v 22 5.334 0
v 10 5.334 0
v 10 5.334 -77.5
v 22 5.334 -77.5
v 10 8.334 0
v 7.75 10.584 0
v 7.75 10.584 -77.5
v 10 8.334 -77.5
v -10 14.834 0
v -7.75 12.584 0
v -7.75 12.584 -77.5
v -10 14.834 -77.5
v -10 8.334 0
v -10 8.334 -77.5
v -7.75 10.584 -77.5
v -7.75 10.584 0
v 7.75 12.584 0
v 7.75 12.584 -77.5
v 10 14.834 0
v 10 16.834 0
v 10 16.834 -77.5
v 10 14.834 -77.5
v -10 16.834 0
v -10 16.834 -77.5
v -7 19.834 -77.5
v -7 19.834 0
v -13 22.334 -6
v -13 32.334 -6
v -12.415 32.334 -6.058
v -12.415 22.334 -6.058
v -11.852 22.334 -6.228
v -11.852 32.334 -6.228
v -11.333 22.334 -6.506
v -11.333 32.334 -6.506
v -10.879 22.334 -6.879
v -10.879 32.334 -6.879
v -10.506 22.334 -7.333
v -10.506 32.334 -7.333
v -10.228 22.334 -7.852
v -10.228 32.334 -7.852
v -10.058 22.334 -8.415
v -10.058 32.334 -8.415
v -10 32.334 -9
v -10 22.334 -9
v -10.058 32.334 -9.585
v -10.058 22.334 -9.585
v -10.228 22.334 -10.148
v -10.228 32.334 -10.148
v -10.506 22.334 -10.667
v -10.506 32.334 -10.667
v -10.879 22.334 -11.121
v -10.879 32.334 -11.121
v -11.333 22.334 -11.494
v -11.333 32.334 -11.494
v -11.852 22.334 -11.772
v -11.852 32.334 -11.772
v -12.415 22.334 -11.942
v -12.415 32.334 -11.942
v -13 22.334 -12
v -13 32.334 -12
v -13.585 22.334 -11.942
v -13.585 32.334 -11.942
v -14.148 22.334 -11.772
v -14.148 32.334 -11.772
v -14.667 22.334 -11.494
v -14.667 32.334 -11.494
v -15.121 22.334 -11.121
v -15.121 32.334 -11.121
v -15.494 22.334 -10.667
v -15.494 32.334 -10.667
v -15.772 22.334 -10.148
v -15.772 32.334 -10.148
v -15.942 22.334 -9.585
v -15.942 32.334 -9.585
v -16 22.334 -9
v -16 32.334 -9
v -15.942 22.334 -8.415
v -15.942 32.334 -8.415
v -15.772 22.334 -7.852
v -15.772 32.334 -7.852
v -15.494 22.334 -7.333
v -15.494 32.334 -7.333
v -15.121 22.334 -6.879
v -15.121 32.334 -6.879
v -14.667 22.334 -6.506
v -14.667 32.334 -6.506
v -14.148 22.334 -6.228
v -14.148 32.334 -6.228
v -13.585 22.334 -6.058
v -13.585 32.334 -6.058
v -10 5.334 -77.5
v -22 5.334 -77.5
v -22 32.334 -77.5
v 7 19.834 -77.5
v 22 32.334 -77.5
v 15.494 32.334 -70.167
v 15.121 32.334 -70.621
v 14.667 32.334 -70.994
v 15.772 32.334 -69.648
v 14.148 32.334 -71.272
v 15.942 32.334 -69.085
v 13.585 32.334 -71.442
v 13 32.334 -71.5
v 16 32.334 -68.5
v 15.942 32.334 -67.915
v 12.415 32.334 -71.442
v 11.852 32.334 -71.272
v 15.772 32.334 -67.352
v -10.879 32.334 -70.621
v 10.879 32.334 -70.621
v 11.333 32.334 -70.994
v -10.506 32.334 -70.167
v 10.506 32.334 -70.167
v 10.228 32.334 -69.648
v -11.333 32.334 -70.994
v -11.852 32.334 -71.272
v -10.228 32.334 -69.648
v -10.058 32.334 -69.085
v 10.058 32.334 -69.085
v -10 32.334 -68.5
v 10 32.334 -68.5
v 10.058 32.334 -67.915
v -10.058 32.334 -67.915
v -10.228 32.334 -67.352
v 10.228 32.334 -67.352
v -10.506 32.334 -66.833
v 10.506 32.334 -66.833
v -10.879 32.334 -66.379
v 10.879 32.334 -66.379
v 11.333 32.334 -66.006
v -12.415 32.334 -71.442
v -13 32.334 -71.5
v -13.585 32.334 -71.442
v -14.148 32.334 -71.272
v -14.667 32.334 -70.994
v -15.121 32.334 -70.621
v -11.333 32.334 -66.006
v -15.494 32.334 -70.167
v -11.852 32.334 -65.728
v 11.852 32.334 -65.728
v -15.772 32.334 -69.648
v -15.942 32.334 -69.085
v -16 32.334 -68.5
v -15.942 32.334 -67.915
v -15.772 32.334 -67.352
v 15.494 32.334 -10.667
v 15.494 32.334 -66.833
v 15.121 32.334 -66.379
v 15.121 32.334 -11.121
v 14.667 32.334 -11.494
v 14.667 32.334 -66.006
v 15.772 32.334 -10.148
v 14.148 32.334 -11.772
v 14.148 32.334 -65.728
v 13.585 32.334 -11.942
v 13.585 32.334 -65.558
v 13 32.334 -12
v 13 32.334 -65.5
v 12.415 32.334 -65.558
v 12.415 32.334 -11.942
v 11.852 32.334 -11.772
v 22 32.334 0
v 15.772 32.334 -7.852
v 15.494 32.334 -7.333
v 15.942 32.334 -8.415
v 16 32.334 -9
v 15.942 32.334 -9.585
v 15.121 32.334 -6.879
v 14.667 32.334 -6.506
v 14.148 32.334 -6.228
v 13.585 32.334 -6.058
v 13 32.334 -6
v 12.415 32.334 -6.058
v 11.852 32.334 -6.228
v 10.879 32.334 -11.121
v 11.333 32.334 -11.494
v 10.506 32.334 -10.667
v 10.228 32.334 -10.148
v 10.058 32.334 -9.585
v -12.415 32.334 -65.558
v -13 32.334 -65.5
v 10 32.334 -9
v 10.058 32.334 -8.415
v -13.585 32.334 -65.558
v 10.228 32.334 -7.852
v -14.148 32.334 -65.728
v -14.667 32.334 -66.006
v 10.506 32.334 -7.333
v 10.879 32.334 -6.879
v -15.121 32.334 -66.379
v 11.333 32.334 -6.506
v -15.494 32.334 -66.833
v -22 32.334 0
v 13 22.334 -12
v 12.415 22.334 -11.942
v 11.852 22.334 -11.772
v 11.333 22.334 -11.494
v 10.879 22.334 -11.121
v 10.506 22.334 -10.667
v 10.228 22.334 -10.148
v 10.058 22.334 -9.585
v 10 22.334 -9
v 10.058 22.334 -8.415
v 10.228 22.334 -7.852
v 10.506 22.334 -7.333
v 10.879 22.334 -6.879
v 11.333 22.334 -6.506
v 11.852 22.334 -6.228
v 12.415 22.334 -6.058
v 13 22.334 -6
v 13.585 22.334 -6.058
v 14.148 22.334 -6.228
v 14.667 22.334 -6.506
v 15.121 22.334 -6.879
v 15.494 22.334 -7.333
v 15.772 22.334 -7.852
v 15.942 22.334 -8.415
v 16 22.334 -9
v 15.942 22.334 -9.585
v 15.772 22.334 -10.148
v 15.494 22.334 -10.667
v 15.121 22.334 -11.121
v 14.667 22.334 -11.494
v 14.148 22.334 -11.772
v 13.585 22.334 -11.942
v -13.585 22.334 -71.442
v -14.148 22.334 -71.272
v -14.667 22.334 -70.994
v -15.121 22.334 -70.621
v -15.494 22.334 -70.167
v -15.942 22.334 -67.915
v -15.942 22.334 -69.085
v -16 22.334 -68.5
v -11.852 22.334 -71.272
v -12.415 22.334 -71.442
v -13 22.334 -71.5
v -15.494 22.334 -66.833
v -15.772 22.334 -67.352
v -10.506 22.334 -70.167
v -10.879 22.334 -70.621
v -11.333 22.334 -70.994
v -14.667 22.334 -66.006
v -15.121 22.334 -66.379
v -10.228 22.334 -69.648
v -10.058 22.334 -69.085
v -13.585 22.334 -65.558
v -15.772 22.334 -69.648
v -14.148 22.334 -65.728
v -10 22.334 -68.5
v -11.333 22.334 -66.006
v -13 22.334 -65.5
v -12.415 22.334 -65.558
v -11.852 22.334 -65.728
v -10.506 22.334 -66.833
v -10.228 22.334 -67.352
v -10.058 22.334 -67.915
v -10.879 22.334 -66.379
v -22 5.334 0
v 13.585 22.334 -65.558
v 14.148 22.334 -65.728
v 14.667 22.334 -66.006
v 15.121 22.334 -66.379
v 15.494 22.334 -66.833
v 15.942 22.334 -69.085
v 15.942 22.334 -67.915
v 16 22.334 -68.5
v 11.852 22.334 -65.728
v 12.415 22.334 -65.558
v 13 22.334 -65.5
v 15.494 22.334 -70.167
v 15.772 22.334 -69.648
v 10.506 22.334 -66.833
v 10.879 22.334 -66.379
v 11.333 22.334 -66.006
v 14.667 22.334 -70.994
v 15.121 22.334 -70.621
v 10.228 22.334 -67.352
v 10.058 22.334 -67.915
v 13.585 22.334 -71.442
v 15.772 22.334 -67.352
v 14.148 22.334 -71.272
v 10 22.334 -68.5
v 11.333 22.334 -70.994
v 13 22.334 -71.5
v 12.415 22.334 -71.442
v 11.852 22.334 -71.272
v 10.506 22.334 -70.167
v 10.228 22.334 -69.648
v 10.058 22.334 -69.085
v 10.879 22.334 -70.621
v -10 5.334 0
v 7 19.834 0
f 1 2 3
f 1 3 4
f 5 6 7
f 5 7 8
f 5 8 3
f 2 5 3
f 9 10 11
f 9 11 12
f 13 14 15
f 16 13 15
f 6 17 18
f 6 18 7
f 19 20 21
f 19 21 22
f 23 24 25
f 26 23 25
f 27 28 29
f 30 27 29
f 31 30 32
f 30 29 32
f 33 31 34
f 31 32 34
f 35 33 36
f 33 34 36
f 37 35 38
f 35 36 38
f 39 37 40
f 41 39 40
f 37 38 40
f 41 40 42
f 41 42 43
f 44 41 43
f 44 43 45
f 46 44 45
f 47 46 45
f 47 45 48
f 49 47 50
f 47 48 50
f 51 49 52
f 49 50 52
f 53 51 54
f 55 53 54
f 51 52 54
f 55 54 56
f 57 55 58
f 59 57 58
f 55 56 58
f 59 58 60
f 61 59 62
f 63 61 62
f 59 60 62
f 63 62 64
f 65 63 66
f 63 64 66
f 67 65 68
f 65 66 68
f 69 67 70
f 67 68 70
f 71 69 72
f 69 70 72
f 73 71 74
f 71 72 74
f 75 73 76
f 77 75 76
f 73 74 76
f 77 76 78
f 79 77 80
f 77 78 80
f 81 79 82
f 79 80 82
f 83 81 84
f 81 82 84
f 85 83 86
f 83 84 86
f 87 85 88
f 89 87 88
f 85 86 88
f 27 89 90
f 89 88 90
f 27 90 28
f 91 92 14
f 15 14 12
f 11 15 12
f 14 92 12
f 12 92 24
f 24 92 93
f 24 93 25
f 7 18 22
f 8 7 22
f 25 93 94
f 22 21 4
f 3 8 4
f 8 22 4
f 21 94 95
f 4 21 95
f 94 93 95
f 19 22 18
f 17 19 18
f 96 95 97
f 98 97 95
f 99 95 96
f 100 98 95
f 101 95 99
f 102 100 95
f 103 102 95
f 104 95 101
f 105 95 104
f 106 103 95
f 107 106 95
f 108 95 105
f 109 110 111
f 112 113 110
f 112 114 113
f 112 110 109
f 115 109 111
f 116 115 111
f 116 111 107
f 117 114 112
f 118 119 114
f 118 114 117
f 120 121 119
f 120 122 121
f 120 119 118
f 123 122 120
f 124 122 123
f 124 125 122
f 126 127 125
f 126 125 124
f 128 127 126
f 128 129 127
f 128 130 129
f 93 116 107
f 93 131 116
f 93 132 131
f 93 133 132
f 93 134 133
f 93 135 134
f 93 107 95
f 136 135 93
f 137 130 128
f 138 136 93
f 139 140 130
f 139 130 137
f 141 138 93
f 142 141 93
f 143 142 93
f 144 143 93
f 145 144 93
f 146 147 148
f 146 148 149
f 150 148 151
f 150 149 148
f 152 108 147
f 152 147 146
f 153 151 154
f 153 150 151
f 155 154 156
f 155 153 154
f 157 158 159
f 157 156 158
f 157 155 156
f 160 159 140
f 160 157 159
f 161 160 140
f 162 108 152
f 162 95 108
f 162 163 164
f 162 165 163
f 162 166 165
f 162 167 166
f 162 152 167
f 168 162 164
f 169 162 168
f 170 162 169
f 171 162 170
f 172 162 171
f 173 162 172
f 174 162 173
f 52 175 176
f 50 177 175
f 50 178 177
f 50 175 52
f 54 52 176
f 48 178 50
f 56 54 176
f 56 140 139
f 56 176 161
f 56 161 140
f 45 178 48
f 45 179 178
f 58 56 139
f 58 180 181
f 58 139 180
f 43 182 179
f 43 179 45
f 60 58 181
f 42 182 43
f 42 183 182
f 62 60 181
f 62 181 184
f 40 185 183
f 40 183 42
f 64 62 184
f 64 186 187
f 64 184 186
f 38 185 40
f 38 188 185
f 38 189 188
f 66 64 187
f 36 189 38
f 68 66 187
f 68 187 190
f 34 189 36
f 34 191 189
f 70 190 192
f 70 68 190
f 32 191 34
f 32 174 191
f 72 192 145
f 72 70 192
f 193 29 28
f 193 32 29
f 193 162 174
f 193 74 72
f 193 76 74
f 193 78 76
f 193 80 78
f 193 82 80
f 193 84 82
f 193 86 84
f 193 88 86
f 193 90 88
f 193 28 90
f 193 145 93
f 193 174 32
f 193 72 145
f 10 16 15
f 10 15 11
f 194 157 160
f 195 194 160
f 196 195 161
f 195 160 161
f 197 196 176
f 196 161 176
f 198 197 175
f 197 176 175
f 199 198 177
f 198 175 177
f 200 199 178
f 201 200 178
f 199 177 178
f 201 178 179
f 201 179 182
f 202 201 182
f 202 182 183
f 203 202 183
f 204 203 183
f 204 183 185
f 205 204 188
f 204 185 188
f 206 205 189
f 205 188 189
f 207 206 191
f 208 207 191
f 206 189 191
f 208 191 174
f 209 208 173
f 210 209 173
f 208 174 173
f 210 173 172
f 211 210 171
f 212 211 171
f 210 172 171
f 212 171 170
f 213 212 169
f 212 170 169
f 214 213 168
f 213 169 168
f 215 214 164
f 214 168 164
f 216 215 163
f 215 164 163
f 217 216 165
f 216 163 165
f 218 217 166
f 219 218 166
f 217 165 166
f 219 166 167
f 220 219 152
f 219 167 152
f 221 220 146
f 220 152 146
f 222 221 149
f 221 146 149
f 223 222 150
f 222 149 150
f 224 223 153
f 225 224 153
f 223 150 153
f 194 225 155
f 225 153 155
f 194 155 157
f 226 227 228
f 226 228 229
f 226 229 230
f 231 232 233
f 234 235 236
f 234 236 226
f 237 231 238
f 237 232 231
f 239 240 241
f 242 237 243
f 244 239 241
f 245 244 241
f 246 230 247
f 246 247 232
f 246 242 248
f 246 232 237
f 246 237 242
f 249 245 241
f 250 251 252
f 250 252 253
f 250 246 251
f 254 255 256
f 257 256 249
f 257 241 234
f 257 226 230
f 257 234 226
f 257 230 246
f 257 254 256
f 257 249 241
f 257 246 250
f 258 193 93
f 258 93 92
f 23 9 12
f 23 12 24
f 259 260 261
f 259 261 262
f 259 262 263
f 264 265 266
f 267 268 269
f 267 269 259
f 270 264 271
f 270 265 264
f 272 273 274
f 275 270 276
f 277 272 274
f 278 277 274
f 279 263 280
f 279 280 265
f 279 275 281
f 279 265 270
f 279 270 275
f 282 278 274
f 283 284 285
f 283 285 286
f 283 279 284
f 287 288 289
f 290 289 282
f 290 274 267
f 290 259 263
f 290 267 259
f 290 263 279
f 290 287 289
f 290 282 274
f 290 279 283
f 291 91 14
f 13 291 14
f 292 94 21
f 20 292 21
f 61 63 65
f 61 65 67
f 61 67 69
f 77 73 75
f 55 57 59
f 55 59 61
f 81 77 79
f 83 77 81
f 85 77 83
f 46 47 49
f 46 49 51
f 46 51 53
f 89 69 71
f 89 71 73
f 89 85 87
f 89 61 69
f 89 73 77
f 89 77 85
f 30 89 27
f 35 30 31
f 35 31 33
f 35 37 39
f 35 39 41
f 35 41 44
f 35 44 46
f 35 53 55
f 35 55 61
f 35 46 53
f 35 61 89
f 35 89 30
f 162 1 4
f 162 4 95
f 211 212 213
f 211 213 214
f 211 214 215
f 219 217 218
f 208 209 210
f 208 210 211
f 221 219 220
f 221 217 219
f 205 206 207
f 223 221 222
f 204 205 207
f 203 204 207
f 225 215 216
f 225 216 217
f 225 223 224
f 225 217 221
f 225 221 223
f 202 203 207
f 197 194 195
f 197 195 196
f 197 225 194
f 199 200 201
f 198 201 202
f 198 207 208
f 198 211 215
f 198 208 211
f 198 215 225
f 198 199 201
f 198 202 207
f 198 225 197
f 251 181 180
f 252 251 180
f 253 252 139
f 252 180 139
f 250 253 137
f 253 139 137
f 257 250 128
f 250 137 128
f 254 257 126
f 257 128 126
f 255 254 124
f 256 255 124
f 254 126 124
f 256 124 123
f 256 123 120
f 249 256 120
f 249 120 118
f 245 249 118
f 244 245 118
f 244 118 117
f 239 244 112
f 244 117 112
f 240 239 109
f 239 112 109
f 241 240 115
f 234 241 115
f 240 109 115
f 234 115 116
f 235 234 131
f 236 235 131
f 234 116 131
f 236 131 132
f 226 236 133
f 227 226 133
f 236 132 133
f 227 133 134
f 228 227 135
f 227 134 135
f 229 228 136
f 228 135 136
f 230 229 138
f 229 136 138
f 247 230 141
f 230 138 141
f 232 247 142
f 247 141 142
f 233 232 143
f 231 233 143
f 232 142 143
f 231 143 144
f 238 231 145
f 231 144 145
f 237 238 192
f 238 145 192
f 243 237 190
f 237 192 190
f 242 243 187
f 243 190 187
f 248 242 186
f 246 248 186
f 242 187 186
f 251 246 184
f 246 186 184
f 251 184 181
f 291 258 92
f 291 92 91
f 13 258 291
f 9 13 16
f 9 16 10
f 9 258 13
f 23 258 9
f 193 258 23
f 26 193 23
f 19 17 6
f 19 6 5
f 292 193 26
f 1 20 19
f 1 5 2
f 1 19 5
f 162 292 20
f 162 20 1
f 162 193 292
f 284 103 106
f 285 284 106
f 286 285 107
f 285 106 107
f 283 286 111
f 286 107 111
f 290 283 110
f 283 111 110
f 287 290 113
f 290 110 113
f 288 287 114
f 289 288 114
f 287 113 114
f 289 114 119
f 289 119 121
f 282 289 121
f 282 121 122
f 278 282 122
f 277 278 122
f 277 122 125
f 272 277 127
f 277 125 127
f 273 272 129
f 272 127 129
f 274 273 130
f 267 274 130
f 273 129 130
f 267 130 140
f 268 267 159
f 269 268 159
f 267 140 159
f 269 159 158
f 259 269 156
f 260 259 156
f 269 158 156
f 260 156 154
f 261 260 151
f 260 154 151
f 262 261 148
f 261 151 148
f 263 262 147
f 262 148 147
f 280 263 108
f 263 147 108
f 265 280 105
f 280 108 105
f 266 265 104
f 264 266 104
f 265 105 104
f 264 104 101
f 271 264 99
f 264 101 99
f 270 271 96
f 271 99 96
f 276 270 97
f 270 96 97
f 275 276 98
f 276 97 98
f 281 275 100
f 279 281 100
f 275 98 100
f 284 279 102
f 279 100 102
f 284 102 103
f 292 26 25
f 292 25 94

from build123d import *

# Parameters (mm, degrees)
BOSS_EXTRUDE1_DEPTH = 77.5
SKETCH2_R           = 3
CUT_EXTRUDE1_DEPTH  = 10


with BuildPart() as part:
    # Sketch1 → Boss-Extrude1 (new body)
    with BuildSketch(Plane.XY):
        Polygon((0, 32.334319527), (0, 19.834319527), (7, 19.834319527), (10, 16.834319527), (10, 14.834319527), (7.75, 12.584319527), (7.75, 10.584319527), (10, 8.334319527), (10, 5.334319527), (22, 5.334319527), (22, 32.334319527), align=None)
        Polygon((-7, 19.834319527), (0, 19.834319527), (0, 32.334319527), (-22, 32.334319527), (-22, 5.334319527), (-10, 5.334319527), (-10, 8.334319527), (-7.75, 10.584319527), (-7.75, 12.584319527), (-10, 14.834319527), (-10, 16.834319527), align=None)
    extrude(amount=-BOSS_EXTRUDE1_DEPTH)

    # Sketch2 → Cut-Extrude1 (cut)
    with BuildSketch(Plane(origin=(0, 32.334319527, 0), x_dir=(1, 0, 0), z_dir=(0, 1, 0))):
        with Locations(Location((-13, 9, 0), (0, 0, 270))):
            Circle(SKETCH2_R)
        with Locations(Location((-13, 68.5, 0), (0, 0, 270))):
            Circle(SKETCH2_R)
        with Locations(Location((13, 68.5, 0), (0, 0, 90))):
            Circle(SKETCH2_R)
        with Locations(Location((13, 9, 0), (0, 0, 90))):
            Circle(SKETCH2_R)
    extrude(amount=-CUT_EXTRUDE1_DEPTH, mode=Mode.SUBTRACT)


solid = part.part
